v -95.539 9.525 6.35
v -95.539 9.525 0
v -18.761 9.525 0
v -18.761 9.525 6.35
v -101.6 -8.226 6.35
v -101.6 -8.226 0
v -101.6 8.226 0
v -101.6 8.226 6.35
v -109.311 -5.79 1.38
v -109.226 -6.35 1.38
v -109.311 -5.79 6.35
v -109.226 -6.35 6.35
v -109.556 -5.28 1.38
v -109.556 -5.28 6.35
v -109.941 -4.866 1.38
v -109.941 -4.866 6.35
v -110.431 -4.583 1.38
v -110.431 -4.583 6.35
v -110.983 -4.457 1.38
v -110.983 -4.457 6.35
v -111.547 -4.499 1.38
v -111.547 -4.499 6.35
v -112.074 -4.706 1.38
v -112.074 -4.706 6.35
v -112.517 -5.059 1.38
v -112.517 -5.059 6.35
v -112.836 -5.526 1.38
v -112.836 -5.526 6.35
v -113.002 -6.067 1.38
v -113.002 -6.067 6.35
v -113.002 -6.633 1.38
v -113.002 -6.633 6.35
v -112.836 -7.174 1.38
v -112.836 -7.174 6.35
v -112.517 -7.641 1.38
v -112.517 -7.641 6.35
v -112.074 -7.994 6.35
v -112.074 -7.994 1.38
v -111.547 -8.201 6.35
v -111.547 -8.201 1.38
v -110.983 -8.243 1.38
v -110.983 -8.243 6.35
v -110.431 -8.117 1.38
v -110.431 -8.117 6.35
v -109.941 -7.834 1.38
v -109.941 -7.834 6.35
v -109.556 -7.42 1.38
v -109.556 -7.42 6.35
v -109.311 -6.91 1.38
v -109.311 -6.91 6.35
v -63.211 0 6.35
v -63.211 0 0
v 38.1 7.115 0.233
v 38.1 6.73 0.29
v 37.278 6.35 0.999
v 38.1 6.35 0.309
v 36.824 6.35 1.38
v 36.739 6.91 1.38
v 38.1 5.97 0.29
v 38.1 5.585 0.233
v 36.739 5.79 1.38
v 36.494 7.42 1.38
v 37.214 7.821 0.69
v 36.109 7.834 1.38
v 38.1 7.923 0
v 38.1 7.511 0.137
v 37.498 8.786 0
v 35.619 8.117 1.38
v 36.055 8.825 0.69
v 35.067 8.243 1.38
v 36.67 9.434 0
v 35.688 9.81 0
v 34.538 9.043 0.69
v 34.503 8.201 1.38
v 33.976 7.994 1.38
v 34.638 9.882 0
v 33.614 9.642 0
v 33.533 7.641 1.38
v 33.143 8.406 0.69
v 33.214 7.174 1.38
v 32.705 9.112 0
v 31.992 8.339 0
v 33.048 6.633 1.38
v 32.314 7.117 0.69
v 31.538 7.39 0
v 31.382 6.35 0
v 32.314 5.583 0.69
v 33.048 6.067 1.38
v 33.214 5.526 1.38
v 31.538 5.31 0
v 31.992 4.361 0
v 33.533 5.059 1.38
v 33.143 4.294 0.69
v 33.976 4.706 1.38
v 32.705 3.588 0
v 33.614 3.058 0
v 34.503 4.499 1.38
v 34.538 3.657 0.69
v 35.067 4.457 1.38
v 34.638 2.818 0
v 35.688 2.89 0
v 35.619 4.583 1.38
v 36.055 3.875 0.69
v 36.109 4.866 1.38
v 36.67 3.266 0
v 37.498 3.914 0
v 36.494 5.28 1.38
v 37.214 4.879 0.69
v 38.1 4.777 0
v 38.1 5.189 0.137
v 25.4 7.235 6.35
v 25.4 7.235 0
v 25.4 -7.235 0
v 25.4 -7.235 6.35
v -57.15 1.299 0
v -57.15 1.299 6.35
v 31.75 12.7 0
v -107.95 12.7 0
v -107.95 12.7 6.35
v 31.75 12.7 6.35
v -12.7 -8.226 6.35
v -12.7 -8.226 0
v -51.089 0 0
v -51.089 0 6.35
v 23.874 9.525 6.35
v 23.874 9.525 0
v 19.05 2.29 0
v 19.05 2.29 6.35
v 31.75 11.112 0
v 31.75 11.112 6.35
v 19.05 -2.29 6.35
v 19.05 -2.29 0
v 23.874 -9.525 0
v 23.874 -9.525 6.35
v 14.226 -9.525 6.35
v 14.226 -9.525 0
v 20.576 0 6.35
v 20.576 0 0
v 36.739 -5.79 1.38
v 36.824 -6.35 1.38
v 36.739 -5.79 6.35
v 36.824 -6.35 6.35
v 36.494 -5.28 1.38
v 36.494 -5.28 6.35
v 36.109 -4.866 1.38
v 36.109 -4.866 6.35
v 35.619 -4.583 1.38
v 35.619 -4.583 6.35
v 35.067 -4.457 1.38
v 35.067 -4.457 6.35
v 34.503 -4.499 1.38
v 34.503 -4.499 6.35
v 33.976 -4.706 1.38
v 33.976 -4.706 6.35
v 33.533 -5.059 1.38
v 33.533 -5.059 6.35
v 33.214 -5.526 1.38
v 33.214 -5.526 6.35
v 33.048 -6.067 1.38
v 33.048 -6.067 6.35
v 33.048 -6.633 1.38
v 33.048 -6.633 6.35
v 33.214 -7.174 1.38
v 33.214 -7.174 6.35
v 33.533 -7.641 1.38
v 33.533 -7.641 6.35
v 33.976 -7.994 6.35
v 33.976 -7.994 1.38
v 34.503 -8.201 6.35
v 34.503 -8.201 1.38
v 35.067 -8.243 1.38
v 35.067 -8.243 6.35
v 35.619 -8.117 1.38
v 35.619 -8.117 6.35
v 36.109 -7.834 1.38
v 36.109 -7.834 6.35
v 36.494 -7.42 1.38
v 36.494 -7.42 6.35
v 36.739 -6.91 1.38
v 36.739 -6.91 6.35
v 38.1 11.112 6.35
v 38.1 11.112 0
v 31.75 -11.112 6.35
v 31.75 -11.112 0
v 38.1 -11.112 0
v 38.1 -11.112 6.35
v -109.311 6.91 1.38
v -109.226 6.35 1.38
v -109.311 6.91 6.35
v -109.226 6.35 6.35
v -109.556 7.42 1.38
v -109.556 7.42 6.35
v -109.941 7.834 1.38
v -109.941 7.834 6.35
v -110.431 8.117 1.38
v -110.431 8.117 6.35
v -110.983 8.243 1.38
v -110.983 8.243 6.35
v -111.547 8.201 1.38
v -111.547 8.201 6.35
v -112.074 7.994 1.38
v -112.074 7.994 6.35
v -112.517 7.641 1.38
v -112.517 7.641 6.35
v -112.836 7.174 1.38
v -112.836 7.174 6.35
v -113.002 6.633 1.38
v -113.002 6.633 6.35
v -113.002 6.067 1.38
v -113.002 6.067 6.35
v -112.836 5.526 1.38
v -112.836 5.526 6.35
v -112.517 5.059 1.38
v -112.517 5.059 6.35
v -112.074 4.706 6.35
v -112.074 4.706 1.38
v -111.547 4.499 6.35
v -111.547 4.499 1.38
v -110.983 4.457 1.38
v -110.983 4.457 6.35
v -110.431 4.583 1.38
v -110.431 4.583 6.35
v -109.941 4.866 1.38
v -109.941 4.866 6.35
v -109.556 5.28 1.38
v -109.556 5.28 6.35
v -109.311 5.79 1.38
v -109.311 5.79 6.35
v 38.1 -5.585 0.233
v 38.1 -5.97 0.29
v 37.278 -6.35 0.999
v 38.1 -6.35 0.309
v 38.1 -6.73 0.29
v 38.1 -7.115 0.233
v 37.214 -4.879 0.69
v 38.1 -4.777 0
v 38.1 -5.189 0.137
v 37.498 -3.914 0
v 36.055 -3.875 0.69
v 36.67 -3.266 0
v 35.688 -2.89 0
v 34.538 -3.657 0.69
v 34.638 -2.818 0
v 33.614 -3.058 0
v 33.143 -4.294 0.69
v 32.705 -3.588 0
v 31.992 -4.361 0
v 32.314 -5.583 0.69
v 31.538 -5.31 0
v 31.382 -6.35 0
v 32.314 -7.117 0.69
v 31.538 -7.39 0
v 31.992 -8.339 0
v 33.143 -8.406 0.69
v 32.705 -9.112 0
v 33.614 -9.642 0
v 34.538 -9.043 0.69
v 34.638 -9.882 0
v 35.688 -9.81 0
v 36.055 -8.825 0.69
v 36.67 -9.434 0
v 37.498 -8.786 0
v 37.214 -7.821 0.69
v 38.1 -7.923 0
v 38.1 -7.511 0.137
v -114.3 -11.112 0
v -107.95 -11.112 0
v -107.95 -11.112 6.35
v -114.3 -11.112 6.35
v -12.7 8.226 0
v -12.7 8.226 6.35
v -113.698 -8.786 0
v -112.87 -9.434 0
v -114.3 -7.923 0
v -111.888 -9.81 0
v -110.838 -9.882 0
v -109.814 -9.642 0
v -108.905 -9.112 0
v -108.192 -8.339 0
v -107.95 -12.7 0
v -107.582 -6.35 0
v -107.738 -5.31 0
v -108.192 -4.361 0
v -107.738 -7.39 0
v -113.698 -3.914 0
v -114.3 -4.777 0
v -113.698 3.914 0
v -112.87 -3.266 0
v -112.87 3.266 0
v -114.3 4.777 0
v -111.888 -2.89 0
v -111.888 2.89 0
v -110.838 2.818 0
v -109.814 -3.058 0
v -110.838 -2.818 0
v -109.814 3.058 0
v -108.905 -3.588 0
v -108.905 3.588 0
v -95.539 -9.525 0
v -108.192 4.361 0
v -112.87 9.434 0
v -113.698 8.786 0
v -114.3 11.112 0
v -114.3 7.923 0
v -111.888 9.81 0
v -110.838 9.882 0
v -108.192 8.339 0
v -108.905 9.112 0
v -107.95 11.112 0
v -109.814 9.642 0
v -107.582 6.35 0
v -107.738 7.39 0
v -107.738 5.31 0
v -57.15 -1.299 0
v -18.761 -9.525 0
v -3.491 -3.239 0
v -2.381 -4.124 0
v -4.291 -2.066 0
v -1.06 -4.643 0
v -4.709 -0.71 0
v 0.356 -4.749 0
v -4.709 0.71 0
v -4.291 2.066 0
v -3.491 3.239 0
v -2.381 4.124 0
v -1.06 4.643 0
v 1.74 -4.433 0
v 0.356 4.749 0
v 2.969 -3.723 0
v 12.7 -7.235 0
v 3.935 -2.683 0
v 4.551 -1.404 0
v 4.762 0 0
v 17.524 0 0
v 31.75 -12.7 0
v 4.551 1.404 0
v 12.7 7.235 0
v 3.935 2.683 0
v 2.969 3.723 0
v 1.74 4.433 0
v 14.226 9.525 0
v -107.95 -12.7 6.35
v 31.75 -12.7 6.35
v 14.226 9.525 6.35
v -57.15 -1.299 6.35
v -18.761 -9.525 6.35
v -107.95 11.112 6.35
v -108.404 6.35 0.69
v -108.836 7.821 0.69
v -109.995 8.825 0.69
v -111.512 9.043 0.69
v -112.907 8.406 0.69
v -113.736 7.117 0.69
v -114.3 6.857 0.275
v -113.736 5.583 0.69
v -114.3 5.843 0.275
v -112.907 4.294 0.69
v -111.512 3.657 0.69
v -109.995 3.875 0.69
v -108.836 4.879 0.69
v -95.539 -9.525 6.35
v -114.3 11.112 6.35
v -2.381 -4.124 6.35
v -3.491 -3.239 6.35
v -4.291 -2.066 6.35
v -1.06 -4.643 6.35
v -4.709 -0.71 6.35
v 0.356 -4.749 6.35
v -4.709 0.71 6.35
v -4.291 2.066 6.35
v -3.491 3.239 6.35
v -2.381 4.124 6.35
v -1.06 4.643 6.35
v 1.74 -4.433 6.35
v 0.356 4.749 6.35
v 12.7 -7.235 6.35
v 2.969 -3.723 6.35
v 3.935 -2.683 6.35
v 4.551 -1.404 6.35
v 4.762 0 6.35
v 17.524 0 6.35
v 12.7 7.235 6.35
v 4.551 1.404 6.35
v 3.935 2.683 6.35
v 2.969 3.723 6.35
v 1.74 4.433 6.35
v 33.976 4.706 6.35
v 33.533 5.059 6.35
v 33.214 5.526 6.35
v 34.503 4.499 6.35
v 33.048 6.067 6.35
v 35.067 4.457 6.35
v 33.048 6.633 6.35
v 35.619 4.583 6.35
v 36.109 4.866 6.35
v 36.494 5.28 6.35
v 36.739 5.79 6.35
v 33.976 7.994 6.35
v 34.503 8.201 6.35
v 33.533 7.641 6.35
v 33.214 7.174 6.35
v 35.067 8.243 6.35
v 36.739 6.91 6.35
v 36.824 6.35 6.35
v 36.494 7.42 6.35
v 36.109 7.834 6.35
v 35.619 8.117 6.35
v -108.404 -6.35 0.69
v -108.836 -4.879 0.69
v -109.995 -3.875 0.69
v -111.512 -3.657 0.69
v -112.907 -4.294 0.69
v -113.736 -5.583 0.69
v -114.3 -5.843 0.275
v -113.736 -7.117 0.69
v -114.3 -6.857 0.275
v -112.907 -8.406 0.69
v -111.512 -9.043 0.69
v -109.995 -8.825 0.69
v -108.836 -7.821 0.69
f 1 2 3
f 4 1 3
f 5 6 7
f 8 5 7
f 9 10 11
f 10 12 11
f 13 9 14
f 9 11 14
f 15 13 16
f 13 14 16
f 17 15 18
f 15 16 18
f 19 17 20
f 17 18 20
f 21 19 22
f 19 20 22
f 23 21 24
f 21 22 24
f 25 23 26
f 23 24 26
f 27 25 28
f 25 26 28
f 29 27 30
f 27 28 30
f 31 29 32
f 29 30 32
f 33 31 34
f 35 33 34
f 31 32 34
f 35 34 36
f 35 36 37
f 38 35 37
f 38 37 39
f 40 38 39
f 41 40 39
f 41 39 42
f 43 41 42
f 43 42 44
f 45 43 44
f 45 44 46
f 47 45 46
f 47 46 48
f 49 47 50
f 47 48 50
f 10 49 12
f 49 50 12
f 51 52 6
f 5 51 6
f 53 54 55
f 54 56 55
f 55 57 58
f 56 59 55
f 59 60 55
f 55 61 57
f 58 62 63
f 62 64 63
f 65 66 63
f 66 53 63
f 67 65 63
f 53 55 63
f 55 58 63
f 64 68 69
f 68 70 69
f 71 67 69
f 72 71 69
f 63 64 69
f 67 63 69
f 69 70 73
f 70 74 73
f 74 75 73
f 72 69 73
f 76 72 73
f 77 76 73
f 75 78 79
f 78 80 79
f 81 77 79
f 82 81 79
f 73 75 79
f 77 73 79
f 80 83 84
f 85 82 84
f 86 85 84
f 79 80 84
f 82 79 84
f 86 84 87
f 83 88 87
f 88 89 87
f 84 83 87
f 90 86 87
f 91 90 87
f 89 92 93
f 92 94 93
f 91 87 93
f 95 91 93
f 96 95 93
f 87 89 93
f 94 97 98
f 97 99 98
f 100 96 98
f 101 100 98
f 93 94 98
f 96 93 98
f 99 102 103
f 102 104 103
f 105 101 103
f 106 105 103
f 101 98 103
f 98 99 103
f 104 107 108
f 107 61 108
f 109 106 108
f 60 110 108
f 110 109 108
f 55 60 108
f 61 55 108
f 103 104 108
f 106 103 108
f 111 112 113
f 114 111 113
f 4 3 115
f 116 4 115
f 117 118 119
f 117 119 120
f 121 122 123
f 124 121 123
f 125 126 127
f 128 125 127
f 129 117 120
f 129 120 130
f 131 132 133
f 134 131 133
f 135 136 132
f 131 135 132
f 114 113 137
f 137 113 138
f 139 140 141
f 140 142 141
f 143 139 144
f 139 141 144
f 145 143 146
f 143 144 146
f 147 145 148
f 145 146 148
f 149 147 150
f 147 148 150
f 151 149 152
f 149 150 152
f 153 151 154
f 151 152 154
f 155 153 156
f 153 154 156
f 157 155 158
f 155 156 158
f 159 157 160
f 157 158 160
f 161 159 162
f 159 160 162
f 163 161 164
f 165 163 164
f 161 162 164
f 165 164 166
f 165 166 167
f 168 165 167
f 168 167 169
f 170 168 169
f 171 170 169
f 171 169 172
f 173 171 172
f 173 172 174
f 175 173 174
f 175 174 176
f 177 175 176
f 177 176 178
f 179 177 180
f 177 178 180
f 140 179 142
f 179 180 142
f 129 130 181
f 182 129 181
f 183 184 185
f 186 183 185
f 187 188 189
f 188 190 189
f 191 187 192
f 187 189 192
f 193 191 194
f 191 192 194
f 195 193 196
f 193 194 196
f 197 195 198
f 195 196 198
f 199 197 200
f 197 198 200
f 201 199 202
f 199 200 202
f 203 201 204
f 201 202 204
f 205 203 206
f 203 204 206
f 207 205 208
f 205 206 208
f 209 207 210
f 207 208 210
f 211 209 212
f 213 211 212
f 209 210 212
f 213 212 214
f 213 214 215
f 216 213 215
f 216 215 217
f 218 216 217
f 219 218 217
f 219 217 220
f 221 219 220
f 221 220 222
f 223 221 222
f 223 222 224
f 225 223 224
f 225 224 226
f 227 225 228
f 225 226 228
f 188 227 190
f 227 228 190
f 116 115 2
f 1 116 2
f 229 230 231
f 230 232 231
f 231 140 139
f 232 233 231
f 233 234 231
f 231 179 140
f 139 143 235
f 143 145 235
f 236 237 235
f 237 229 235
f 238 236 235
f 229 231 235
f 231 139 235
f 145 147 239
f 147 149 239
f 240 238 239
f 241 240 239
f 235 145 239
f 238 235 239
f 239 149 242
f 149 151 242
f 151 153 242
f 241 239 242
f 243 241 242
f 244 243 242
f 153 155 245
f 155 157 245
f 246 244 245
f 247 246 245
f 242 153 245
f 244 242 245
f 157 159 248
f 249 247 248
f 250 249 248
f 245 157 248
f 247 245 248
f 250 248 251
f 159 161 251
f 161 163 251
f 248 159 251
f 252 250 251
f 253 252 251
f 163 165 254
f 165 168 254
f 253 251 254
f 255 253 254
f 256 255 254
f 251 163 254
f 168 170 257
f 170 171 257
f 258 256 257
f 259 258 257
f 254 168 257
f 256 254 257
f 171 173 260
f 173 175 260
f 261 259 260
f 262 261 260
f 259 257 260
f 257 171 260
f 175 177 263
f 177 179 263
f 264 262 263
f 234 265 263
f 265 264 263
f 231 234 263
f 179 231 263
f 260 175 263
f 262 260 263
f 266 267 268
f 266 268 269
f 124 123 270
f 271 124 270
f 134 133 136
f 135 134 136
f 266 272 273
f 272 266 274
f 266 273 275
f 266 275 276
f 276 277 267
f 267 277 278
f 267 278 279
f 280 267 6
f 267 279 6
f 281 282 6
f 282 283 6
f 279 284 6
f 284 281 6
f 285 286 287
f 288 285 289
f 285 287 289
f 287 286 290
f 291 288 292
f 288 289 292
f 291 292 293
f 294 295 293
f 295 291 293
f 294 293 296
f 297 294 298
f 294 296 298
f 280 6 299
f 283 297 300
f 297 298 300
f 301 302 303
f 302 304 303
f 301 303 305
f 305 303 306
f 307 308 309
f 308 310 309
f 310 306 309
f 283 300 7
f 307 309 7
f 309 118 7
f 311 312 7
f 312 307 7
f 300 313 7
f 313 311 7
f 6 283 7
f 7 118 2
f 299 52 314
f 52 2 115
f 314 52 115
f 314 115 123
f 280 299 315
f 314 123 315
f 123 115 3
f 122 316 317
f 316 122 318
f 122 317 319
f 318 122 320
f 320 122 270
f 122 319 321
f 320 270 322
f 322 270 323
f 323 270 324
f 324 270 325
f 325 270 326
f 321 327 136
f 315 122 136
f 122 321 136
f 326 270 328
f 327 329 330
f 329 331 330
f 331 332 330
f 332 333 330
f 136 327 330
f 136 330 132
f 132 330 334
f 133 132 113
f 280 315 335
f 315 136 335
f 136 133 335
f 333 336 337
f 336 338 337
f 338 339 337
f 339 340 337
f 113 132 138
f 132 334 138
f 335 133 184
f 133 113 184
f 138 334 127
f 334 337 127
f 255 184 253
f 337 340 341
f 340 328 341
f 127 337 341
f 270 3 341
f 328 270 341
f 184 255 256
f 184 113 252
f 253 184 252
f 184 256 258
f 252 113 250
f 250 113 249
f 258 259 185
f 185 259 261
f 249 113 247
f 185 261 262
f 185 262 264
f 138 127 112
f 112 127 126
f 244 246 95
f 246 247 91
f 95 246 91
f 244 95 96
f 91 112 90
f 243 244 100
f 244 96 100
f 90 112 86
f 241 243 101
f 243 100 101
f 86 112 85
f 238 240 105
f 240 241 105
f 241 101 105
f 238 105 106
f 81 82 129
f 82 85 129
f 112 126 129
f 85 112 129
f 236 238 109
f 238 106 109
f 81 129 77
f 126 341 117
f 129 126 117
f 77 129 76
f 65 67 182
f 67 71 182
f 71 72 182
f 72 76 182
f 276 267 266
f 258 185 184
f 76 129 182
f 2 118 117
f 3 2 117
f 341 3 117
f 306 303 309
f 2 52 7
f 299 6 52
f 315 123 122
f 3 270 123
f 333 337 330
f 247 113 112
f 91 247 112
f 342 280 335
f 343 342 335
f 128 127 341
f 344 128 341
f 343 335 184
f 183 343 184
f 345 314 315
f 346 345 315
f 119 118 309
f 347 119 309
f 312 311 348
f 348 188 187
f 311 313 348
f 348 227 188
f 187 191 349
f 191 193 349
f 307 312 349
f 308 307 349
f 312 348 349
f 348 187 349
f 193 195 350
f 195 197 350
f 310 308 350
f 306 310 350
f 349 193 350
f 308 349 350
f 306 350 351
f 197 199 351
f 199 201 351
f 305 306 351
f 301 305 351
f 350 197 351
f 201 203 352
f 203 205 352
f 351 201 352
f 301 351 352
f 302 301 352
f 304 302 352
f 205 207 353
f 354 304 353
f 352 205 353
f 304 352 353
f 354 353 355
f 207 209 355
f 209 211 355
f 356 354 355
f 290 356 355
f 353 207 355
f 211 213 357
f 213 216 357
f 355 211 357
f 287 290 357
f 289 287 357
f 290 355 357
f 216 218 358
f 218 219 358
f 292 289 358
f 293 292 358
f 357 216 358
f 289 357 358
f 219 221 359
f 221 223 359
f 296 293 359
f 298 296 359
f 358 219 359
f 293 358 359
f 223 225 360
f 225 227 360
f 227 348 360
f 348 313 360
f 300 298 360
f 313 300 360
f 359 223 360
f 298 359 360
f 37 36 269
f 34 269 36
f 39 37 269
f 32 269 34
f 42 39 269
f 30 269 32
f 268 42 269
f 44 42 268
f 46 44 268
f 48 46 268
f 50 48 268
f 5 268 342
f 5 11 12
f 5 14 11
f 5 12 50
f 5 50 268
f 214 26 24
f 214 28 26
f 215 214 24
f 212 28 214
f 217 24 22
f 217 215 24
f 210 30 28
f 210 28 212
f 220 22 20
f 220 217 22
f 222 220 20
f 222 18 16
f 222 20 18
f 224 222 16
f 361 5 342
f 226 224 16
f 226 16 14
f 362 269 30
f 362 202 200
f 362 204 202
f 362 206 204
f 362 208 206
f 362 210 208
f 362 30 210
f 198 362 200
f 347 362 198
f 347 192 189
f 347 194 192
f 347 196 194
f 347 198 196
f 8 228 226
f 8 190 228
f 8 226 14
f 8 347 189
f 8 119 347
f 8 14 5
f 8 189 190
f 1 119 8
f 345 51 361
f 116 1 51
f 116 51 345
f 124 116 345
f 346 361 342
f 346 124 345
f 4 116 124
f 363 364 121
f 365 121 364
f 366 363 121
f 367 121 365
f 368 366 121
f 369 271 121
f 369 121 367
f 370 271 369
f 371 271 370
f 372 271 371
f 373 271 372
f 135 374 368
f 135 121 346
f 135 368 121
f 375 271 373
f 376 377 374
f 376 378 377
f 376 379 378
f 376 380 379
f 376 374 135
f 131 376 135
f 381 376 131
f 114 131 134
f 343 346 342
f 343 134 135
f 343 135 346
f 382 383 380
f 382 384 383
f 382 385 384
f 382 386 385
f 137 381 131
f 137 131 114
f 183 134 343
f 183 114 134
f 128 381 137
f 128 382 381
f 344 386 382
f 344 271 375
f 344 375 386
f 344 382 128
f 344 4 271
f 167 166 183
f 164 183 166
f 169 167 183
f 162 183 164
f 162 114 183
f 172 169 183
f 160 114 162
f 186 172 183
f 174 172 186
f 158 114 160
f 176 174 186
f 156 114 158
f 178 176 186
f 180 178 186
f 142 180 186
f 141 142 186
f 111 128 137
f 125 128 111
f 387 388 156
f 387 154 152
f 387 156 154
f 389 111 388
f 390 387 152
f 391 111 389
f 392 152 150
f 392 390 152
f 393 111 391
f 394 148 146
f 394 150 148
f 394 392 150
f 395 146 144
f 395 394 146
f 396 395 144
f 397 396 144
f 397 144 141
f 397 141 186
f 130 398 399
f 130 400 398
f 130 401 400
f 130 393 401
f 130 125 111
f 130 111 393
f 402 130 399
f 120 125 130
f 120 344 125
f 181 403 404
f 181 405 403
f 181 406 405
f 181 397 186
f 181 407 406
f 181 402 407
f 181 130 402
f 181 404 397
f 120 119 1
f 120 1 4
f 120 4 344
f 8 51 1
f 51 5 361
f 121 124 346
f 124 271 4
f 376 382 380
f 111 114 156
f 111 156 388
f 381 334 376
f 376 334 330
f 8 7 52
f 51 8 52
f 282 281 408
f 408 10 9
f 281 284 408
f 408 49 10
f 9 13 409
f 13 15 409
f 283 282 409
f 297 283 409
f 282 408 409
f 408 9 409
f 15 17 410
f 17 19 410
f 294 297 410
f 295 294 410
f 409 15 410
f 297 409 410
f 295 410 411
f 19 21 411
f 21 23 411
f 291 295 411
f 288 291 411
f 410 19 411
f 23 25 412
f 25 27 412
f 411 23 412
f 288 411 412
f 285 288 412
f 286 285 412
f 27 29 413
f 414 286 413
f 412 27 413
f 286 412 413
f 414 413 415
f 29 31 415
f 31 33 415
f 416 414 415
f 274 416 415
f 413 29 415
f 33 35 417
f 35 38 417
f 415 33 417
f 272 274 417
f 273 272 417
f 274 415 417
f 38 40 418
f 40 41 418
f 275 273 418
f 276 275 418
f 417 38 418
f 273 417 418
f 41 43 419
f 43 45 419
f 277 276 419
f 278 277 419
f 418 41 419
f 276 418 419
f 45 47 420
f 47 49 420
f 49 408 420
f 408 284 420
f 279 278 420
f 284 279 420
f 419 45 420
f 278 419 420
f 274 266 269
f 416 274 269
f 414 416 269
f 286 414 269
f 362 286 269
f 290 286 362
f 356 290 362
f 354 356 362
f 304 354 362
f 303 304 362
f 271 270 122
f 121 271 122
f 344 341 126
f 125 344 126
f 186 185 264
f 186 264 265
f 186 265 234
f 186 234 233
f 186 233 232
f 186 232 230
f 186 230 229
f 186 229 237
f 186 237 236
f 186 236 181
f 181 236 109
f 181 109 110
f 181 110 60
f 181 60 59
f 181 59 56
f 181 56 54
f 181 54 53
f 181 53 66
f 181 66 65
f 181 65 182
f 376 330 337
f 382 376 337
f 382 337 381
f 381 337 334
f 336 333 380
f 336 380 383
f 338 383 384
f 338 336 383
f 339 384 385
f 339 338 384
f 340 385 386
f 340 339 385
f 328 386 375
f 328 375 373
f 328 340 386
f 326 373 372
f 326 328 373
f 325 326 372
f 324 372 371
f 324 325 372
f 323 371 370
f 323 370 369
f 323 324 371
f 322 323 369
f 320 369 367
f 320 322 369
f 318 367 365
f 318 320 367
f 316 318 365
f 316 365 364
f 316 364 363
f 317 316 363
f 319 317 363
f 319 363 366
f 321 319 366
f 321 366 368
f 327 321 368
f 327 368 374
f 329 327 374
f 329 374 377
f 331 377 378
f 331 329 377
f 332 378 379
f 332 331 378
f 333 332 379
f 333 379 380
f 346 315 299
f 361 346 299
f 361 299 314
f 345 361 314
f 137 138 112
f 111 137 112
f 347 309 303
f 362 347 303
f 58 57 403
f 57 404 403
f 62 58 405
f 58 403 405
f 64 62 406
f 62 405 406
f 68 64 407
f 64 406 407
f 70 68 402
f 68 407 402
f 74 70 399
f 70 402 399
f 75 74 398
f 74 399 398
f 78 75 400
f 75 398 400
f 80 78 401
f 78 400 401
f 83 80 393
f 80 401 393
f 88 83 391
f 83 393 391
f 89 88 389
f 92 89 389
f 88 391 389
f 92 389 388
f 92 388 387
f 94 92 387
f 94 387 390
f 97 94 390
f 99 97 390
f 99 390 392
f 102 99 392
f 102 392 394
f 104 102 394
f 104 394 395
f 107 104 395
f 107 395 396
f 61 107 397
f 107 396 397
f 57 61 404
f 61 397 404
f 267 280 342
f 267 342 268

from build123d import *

# Parameters (mm, degrees)
SKETCH1_W                                         = 152.4
SKETCH1_H                                         = 25.4
SKETCH1_R                                         = 4.7625
BOSS_EXTRUDE1_DEPTH                               = 6.35
CSK_FOR_6_FLAT_HEAD_MACHINE_SCREW_100_D           = 3.7973
CSK_FOR_6_FLAT_HEAD_MACHINE_SCREW_100_CSINK_D     = 7.0866
CSK_FOR_6_FLAT_HEAD_MACHINE_SCREW_100_CSINK_ANGLE = 100
SKETCH5_W                                         = 6.35
SKETCH5_H                                         = 1.5875
CUT_EXTRUDE1_DEPTH                                = 116.178567885
MIRROR2_COPY_1_SKETCH_W                           = 6.35
MIRROR2_COPY_1_SKETCH_H                           = 1.5875
MIRROR2_COPY_1_DEPTH                              = 116.178567885
MIRROR2_COPY_2_SKETCH_W                           = 6.35
MIRROR2_COPY_2_SKETCH_H                           = 1.5875
MIRROR2_COPY_2_DEPTH                              = 116.178567885


with BuildPart() as part:
    # Sketch1 → Boss-Extrude1 (new body)
    with BuildSketch(Plane.XY):
        with Locations((-38.1, 0)):
            Rectangle(SKETCH1_W, SKETCH1_H)
        Polygon((-101.6, -8.226169089), (-101.6, 8.226169089), (-63.211210917, 0), align=None, mode=Mode.SUBTRACT)
        Polygon((-18.761210917, -9.525), (-95.538789083, -9.525), (-57.15, -1.298830911), align=None, mode=Mode.SUBTRACT)
        Polygon((-12.7, 8.226169089), (-12.7, -8.226169089), (-51.088789083, 0), align=None, mode=Mode.SUBTRACT)
        Polygon((-95.538789083, 9.525), (-18.761210917, 9.525), (-57.15, 1.298830911), align=None, mode=Mode.SUBTRACT)
        Polygon((14.22635004, 9.525), (23.87364996, 9.525), (19.05, 2.28952506), align=None, mode=Mode.SUBTRACT)
        Circle(SKETCH1_R, mode=Mode.SUBTRACT)
        Polygon((12.7, -7.23547494), (12.7, 7.23547494), (17.52364996, 0), align=None, mode=Mode.SUBTRACT)
        Polygon((23.87364996, -9.525), (14.22635004, -9.525), (19.05, -2.28952506), align=None, mode=Mode.SUBTRACT)
        Polygon((25.4, 7.23547494), (25.4, -7.23547494), (20.57635004, 0), align=None, mode=Mode.SUBTRACT)
    extrude(amount=BOSS_EXTRUDE1_DEPTH)

    # CSK for #6 Flat Head Machine Screw (100)1 (through all)
    with Locations(Plane(origin=(0, 0, 0), x_dir=(-1, 0, 0), z_dir=(0, 0, -1))):
        with Locations((-34.925, 6.35), (-34.925, -6.35), (111.125, -6.35), (111.125, 6.35)):
            CounterSinkHole(CSK_FOR_6_FLAT_HEAD_MACHINE_SCREW_100_D / 2, CSK_FOR_6_FLAT_HEAD_MACHINE_SCREW_100_CSINK_D / 2, counter_sink_angle=CSK_FOR_6_FLAT_HEAD_MACHINE_SCREW_100_CSINK_ANGLE)

    # Sketch5 → Cut-Extrude1 (cut, through all)
    with BuildSketch(Plane(origin=(0, 0, 0), x_dir=(-1, 0, 0), z_dir=(0, 0, -1))):
        with Locations((111.125, -11.90625)):
            Rectangle(SKETCH5_W, SKETCH5_H)
    cut_extrude1 = extrude(amount=-CUT_EXTRUDE1_DEPTH, mode=Mode.SUBTRACT)

    # Mirror1: Cut-Extrude1 across plane
    add(cut_extrude1.mirror(Plane.ZY.offset(38.1)), mode=Mode.SUBTRACT)

    # Mirror2 copy 1 sketch → Mirror2 copy 1 (cut, through all)
    with BuildSketch(Plane(origin=(-76.2, 0, 0), x_dir=(1, 0, 0), z_dir=(0, 0, -1))):
        with Locations((111.125, -11.90625)):
            Rectangle(MIRROR2_COPY_1_SKETCH_W, MIRROR2_COPY_1_SKETCH_H)
    extrude(amount=-MIRROR2_COPY_1_DEPTH, mode=Mode.SUBTRACT)

    # Mirror2 copy 2 sketch → Mirror2 copy 2 (cut, through all)
    with BuildSketch(Plane(origin=(0, 0, 0), x_dir=(-1, 0, 0), z_dir=(0, 0, -1))):
        with Locations((111.125, 11.90625)):
            Rectangle(MIRROR2_COPY_2_SKETCH_W, MIRROR2_COPY_2_SKETCH_H)
    extrude(amount=-MIRROR2_COPY_2_DEPTH, mode=Mode.SUBTRACT)


solid = part.part
